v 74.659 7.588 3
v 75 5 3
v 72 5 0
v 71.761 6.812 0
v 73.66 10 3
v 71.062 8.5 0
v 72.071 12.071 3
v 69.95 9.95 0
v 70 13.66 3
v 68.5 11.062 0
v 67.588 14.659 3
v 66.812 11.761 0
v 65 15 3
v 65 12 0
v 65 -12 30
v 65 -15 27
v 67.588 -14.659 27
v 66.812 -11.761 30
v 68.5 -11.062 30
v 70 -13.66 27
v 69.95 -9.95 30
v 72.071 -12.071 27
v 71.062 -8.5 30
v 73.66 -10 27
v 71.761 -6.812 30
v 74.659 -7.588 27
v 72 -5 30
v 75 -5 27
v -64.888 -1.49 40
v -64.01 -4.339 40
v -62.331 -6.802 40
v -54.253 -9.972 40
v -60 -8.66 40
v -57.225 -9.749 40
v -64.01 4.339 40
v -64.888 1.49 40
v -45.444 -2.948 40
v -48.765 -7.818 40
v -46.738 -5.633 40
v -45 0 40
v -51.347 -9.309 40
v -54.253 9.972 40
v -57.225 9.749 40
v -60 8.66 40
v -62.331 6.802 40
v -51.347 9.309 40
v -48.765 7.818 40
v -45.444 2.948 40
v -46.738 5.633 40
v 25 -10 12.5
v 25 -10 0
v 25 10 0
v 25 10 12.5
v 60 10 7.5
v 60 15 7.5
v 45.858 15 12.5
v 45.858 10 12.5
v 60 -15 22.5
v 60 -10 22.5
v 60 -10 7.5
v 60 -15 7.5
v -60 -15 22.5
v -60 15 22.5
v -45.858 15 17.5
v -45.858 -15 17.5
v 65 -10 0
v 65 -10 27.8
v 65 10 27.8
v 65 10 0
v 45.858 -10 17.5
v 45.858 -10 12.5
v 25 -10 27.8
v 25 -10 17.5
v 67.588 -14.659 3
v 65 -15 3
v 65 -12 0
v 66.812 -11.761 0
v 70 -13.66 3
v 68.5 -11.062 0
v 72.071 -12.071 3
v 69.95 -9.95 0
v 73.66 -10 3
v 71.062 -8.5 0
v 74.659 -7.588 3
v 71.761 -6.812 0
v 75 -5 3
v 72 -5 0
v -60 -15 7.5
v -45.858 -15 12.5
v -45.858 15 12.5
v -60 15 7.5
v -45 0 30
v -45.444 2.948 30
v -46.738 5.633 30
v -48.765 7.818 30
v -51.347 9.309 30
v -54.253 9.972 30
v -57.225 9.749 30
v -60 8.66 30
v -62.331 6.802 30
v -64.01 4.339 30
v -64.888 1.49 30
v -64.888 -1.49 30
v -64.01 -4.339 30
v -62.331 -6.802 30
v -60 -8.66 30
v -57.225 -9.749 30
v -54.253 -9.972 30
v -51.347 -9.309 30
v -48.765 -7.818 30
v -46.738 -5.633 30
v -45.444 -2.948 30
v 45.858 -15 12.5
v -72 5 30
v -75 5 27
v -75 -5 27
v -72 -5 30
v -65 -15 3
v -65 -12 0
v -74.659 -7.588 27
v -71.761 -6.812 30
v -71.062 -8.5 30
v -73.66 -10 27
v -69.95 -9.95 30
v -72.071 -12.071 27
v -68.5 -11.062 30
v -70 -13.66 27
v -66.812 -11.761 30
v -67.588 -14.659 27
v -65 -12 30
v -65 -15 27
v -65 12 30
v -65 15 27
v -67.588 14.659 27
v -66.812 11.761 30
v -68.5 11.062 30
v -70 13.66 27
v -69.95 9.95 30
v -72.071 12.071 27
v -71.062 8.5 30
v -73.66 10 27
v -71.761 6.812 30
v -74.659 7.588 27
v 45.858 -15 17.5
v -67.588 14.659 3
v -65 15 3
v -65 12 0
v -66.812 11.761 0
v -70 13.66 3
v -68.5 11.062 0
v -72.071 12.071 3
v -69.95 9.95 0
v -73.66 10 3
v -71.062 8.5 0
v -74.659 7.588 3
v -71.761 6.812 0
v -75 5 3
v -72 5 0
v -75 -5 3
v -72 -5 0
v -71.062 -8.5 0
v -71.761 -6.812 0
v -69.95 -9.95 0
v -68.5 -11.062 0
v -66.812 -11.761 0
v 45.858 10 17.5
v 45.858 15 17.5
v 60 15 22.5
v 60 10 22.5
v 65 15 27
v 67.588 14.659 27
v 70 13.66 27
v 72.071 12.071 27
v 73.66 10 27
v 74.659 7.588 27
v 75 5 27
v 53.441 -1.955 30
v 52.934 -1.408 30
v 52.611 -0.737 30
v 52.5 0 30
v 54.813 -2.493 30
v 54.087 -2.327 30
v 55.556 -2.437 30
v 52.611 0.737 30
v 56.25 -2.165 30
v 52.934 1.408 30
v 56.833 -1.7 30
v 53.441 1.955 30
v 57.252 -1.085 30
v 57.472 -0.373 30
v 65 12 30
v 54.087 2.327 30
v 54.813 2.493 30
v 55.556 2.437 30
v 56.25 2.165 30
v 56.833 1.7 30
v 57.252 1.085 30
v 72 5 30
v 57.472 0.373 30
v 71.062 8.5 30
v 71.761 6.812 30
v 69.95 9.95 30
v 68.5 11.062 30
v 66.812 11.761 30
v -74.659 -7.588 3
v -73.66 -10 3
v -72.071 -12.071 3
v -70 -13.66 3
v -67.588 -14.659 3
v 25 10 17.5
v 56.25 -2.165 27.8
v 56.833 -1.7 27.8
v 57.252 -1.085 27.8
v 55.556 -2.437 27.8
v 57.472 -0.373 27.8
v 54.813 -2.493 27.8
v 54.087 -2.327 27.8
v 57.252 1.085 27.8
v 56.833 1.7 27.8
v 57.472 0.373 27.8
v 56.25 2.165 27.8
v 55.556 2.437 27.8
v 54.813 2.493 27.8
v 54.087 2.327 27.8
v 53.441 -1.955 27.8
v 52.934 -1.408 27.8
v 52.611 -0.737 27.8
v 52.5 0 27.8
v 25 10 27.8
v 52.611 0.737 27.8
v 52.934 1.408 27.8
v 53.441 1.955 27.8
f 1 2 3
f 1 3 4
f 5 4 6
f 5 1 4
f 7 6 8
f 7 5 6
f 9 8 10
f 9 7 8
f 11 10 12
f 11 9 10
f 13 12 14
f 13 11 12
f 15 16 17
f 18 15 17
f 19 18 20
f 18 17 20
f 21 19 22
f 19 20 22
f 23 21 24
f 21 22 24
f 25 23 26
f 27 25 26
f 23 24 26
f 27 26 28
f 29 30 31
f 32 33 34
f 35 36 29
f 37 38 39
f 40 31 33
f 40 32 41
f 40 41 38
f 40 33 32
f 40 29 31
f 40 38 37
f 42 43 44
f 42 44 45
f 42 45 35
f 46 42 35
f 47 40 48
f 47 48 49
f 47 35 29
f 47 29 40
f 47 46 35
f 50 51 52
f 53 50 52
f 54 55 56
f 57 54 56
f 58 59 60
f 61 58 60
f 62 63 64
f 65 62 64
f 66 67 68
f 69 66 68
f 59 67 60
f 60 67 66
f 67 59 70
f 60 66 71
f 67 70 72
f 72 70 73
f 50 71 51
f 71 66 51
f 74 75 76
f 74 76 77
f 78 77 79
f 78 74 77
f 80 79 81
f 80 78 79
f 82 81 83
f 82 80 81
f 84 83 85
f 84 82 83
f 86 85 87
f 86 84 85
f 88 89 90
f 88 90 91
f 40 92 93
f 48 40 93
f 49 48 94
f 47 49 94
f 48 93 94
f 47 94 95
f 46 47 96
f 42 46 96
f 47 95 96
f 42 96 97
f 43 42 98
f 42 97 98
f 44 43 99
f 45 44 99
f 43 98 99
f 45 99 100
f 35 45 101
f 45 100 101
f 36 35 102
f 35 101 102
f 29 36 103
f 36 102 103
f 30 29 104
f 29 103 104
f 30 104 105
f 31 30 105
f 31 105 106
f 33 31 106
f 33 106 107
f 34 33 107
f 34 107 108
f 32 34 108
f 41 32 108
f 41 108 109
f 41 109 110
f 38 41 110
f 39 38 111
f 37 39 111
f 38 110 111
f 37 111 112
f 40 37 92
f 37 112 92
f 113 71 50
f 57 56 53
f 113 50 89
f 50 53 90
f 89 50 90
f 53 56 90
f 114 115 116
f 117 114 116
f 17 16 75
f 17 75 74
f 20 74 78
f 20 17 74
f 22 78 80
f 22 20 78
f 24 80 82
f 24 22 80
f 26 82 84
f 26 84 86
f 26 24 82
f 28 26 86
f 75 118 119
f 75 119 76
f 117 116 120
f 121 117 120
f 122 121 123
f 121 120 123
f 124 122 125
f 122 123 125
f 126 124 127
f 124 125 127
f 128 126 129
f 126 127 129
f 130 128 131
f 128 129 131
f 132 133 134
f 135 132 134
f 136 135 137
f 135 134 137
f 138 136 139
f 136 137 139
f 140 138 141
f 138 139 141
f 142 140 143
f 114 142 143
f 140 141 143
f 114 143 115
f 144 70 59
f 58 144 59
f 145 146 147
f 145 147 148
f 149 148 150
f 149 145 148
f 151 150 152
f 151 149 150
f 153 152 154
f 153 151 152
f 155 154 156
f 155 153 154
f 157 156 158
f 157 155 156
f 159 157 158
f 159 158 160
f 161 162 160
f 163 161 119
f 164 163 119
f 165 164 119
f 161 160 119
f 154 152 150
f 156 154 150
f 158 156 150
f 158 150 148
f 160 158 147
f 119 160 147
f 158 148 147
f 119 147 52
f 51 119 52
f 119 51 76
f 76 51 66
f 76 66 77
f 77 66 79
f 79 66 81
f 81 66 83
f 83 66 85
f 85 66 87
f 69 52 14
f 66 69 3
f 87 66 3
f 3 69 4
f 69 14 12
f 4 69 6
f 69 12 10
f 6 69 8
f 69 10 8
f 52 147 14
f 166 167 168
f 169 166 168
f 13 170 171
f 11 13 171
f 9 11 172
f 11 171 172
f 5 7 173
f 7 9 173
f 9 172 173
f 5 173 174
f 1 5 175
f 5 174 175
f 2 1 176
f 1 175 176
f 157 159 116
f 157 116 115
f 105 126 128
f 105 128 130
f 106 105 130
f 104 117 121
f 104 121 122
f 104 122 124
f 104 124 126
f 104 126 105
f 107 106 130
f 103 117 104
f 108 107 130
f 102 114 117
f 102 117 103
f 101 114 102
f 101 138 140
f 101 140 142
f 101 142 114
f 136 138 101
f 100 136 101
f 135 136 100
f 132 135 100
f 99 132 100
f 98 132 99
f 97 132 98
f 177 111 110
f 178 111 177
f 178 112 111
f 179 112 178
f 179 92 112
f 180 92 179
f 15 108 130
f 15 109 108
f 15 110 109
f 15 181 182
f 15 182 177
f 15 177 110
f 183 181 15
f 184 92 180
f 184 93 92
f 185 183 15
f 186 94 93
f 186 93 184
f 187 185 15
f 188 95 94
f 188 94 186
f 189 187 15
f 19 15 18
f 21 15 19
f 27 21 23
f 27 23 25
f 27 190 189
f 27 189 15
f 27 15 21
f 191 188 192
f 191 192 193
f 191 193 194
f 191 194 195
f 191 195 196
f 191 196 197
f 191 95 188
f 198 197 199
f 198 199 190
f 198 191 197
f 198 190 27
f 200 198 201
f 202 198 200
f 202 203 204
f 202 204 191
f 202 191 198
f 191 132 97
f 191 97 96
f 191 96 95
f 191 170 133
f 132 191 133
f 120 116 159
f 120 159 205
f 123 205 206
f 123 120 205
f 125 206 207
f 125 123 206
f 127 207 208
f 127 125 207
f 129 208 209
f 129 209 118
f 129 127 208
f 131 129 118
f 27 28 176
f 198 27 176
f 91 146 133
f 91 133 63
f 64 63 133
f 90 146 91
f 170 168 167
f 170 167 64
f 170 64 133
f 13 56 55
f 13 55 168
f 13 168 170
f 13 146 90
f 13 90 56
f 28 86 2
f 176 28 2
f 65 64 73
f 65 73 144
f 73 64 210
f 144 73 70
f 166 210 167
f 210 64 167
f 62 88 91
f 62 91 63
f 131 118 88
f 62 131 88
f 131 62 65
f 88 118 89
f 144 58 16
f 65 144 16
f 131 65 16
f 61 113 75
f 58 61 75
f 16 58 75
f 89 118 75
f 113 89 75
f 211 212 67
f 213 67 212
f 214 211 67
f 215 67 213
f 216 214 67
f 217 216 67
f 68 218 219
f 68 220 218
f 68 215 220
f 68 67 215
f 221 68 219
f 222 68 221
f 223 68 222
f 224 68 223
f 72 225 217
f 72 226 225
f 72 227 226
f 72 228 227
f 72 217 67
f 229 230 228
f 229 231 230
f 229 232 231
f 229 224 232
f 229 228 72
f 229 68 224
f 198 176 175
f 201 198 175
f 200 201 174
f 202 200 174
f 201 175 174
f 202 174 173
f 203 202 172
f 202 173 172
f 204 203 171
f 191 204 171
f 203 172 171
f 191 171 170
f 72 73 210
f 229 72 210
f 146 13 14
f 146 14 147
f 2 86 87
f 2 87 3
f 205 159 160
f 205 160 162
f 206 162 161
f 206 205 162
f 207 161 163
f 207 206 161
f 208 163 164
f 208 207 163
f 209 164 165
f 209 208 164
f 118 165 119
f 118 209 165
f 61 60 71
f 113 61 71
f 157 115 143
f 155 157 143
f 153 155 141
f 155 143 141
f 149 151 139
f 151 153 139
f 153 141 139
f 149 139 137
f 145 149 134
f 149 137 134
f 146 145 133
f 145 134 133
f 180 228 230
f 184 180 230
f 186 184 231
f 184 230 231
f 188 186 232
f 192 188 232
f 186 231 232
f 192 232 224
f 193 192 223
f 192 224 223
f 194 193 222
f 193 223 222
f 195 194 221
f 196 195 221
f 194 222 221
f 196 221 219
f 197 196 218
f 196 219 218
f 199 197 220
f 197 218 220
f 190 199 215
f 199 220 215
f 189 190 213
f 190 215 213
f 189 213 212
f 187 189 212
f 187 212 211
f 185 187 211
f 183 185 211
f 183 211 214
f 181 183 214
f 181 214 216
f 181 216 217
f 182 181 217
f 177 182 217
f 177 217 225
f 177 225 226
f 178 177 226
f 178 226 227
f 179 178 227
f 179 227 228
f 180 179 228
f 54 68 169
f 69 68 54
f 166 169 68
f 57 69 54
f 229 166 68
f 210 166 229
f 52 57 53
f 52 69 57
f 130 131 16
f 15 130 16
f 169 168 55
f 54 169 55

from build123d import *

# Parameters (mm, degrees)
SKETCH1_W           = 150
SKETCH1_H           = 30
BOSS_EXTRUDE1_DEPTH = 30
SKETCH2_R           = 10
BOSS_EXTRUDE2_DEPTH = 10
FILLET1_R           = 10
SKETCH3_W           = 40
SKETCH3_H           = 20
CUT_EXTRUDE1_DEPTH  = 27.8
SKETCH4_R           = 2.5
CUT_EXTRUDE2_DEPTH  = 27.8
CUT_EXTRUDE3_DEPTH  = 31
CHAMFER1_SIZE       = 3


with BuildPart() as part:
    # Sketch1 → Boss-Extrude1 (new body)
    with BuildSketch(Plane.XY):
        Rectangle(SKETCH1_W, SKETCH1_H)
    extrude(amount=BOSS_EXTRUDE1_DEPTH)

    # Sketch2 → Boss-Extrude2 (add)
    with BuildSketch(Plane.XY.offset(30)):
        with Locations((-55, 0)):
            Circle(SKETCH2_R)
    extrude(amount=BOSS_EXTRUDE2_DEPTH)

    # Fillet1
    fillet1_edges = [part.edges().sort_by_distance(p)[0] for p in [
        (75, -15, 15),
        (-75, -15, 15),
        (-75, 15, 15),
        (75, 15, 15),
    ]]
    fillet(fillet1_edges, radius=FILLET1_R)

    # Sketch3 → Cut-Extrude1 (cut)
    with BuildSketch(Plane(origin=(0, 0, 0), x_dir=(-1, 0, 0), z_dir=(0, 0, -1))):
        with Locations((-45, 0)):
            Rectangle(SKETCH3_W, SKETCH3_H)
    extrude(amount=-CUT_EXTRUDE1_DEPTH, mode=Mode.SUBTRACT)

    # Sketch4 → Cut-Extrude2 (cut)
    with BuildSketch(Plane(origin=(0, 0, 27.8), x_dir=(-1, 0, 0), z_dir=(0, 0, -1))):
        with Locations((-55, 0)):
            Circle(SKETCH4_R)
    extrude(amount=-CUT_EXTRUDE2_DEPTH, mode=Mode.SUBTRACT)

    # Sketch5 → Cut-Extrude3 (cut, through all)
    with BuildSketch(Plane(origin=(0, 15, 0), x_dir=(1, 0, 0), z_dir=(0, 1, 0))):
        Polygon((-60, -7.5), (-60, -22.5), (-45.857864376, -17.5), (45.857864376, -17.5), (60, -22.5), (60, -7.5), (45.857864376, -12.5), (-45.857864376, -12.5), align=None)
    extrude(amount=-CUT_EXTRUDE3_DEPTH, mode=Mode.SUBTRACT)

    # Chamfer1
    chamfer1_edges = [part.edges().sort_by_distance(p)[0] for p in [
        (75, 0, 0),
        (75, 0, 30),
        (0, -15, 0),
        (-75, 0, 0),
        (0, 15, 0),
        (-72.071067812, 12.071067812, 0),
        (-72.071067812, -12.071067812, 0),
        (72.071067812, 12.071067812, 0),
        (72.071067812, -12.071067812, 0),
        (0, -15, 30),
        (0, 15, 30),
        (-75, 0, 30),
        (-72.071067812, 12.071067812, 30),
        (-72.071067812, -12.071067812, 30),
        (72.071067812, 12.071067812, 30),
        (72.071067812, -12.071067812, 30),
    ]]
    chamfer(chamfer1_edges, length=CHAMFER1_SIZE)


solid = part.part
